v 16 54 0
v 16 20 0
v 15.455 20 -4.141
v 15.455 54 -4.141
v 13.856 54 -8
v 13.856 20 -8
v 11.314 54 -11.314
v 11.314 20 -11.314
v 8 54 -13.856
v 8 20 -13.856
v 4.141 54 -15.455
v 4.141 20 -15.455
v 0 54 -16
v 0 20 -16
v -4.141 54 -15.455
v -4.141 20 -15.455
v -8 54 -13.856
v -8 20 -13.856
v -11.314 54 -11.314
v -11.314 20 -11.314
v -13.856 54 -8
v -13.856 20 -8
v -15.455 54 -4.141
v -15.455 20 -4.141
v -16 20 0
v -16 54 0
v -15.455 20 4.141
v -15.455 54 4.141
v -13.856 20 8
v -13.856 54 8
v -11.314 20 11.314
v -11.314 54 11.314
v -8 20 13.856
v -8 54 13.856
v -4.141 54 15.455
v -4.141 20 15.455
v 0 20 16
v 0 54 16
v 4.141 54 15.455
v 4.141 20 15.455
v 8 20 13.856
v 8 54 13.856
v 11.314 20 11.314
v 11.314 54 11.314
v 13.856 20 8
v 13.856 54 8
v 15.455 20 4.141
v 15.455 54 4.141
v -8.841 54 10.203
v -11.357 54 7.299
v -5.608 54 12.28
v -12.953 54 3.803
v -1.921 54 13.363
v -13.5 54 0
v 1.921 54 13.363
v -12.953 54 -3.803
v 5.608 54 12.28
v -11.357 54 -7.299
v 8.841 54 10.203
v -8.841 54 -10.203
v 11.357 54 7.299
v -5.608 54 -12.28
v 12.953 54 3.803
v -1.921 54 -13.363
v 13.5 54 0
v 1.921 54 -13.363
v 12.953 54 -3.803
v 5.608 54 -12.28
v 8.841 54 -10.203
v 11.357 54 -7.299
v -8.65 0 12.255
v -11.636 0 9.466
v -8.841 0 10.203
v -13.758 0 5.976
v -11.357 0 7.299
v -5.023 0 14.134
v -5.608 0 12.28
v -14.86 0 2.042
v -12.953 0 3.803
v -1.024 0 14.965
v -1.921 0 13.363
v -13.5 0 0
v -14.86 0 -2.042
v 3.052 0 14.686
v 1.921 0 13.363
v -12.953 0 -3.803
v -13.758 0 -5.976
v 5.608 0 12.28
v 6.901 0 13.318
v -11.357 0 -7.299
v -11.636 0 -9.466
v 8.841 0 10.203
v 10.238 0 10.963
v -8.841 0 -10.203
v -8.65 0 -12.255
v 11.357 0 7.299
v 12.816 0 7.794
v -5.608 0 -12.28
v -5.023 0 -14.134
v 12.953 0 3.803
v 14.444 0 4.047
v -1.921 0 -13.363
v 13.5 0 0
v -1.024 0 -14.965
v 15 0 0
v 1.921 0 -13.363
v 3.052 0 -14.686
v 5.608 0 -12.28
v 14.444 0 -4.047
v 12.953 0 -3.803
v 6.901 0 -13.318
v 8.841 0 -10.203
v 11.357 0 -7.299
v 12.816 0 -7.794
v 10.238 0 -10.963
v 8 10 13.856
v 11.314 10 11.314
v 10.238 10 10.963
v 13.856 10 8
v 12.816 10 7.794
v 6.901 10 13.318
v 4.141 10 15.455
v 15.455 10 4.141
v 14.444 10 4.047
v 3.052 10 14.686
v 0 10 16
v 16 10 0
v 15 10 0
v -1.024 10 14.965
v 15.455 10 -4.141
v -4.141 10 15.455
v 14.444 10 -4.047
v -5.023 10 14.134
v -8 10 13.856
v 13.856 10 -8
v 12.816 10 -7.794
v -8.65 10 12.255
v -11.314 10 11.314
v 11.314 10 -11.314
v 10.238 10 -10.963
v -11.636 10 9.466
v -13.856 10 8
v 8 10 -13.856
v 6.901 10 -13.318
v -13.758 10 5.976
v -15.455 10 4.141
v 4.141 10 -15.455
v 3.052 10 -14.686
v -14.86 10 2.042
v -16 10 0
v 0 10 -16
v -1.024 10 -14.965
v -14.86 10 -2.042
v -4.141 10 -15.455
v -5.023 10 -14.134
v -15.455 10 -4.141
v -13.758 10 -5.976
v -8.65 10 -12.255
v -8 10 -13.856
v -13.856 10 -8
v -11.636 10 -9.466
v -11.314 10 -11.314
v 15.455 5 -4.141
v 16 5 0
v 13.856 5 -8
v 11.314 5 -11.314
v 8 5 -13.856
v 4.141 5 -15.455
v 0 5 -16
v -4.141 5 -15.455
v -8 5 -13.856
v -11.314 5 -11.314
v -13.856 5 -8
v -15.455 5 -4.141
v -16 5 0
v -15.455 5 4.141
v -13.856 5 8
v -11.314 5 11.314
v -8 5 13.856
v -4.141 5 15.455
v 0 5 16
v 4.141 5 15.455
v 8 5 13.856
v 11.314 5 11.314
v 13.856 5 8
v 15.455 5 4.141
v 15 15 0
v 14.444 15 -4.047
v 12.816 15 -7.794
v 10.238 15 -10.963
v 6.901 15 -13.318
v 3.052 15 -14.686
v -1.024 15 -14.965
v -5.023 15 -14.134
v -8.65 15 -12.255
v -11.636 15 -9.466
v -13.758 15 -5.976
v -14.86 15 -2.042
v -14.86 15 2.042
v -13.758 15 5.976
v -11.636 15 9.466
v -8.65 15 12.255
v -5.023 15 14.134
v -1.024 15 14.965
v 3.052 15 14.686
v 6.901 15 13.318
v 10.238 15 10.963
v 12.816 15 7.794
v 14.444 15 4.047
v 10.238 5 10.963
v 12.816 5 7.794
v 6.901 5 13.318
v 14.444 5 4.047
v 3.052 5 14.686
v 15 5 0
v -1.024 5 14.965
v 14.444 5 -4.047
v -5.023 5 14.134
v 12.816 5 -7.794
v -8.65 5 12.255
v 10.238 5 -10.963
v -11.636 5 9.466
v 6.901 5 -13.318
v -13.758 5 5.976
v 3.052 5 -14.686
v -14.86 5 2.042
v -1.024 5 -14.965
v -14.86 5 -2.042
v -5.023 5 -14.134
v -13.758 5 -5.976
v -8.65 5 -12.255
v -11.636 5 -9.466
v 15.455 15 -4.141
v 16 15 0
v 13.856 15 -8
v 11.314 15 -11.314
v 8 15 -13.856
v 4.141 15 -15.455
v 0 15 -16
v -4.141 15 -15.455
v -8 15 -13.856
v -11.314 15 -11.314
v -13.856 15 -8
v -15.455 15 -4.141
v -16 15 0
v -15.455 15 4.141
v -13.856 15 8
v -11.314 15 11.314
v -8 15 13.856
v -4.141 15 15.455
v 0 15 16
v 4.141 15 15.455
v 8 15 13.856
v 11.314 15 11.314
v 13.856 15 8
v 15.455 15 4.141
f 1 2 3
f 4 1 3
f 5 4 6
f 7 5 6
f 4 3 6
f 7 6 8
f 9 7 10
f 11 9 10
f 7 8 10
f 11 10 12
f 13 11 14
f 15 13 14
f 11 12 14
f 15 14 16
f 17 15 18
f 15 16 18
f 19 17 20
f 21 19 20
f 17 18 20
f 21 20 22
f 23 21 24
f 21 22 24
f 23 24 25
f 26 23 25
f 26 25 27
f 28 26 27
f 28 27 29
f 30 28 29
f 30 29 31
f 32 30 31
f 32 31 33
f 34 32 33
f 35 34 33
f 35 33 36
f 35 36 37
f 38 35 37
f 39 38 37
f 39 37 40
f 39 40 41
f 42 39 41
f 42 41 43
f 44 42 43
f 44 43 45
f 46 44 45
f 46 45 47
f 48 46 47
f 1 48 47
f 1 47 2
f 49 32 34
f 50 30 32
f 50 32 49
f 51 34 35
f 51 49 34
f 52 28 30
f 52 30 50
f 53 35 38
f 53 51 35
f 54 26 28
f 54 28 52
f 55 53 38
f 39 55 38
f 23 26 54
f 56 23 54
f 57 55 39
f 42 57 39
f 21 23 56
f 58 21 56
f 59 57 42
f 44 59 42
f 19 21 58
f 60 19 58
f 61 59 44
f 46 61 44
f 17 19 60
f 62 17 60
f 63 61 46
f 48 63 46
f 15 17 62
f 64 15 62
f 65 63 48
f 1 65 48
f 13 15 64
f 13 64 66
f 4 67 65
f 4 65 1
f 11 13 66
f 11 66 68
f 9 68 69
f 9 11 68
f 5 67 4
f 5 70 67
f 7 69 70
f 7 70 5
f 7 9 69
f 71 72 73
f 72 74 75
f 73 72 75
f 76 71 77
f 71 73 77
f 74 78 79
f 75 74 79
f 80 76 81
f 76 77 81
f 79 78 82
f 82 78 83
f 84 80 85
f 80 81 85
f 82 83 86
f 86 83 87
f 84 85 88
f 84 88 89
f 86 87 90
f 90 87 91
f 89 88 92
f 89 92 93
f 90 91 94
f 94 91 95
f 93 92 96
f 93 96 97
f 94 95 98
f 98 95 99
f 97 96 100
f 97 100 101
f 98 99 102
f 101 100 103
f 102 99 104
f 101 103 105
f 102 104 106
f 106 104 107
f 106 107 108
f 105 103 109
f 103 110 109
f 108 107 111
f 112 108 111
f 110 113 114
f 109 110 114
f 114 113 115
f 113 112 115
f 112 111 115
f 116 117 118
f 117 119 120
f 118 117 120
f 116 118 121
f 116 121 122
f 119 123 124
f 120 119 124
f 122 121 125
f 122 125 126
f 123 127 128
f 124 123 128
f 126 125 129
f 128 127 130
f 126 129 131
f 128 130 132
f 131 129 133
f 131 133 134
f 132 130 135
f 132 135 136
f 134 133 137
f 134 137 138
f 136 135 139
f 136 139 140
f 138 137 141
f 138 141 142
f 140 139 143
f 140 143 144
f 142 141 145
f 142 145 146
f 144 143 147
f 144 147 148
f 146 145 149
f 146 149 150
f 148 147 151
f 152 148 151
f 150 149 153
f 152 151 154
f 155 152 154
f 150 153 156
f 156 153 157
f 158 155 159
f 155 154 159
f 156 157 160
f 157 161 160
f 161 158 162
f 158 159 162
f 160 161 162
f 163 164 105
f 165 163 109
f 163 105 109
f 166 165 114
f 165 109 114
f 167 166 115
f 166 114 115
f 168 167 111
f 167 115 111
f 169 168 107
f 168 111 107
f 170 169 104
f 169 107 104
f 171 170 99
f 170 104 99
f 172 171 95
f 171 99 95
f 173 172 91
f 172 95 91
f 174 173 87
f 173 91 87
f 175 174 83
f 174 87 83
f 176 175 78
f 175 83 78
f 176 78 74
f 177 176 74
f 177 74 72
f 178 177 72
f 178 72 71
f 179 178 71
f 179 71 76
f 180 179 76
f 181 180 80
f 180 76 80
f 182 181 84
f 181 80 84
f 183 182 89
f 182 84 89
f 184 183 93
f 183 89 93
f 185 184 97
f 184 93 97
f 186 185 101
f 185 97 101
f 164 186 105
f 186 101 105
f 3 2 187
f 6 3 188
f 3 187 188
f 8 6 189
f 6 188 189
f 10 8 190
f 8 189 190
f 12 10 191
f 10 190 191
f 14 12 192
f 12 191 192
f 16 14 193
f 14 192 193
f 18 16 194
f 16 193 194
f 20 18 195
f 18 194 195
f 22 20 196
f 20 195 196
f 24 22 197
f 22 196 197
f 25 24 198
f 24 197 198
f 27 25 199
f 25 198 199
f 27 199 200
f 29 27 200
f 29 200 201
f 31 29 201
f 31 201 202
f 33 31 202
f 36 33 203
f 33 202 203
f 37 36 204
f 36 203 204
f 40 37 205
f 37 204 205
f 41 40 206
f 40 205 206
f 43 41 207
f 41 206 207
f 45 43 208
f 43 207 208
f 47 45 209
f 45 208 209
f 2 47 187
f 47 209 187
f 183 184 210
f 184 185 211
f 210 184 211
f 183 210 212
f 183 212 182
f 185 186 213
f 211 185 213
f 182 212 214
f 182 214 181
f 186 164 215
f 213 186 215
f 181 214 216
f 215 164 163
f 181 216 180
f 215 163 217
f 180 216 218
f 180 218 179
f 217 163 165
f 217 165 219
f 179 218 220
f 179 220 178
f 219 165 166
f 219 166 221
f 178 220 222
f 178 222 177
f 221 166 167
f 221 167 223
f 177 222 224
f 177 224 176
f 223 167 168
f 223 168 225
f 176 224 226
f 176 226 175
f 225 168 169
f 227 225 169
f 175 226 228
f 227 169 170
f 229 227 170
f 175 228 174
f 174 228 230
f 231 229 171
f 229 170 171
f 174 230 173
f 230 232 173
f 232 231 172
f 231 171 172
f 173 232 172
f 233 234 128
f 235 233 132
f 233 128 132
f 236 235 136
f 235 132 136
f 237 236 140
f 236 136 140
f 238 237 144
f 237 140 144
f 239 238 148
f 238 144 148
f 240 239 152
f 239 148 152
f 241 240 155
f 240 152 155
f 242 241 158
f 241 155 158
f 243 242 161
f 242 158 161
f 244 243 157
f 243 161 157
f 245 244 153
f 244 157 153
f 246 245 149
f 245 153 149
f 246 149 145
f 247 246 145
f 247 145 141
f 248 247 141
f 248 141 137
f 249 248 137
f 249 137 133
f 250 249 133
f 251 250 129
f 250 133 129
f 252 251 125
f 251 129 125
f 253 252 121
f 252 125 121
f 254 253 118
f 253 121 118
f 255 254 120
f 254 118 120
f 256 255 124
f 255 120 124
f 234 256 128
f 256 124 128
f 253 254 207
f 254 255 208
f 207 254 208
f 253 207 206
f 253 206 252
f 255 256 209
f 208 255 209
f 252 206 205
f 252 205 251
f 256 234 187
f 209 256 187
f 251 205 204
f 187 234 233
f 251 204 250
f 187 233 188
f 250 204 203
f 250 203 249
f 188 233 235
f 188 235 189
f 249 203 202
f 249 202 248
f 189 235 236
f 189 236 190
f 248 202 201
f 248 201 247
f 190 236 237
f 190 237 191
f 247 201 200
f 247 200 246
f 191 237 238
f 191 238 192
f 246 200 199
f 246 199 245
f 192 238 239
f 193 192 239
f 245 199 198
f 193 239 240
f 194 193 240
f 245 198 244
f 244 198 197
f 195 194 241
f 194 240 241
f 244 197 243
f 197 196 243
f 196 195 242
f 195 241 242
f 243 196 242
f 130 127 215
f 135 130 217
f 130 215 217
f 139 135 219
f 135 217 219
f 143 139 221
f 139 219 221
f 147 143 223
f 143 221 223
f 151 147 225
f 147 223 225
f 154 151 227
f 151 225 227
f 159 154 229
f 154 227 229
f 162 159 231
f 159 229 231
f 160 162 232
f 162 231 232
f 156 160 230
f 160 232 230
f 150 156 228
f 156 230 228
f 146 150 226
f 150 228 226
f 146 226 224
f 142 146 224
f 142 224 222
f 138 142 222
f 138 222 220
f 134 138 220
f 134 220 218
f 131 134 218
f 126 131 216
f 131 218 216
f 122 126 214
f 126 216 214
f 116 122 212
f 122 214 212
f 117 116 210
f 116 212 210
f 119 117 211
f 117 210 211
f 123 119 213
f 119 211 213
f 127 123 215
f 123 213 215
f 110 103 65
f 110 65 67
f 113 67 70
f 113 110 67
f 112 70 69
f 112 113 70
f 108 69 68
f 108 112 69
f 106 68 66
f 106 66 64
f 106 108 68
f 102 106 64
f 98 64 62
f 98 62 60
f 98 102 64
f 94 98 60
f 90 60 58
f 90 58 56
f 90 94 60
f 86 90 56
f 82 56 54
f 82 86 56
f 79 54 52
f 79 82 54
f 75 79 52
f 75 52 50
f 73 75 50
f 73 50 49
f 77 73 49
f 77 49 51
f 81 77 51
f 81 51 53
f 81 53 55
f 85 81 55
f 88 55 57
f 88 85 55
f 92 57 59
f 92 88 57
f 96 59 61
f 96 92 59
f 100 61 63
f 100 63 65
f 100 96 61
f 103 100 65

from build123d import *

# Parameters (mm, degrees)
SKETCH1_R           = 16
SKETCH1_R_2         = 13.5
BOSS_EXTRUDE1_DEPTH = 54


with BuildPart() as part:
    # Sketch1 → Boss-Extrude1 (new body)
    with BuildSketch(Plane(origin=(0, 0, 0), x_dir=(1, 0, 0), z_dir=(0, 1, 0))):
        Circle(SKETCH1_R)
        Circle(SKETCH1_R_2, mode=Mode.SUBTRACT)
    extrude(amount=BOSS_EXTRUDE1_DEPTH)

    # Sketch2 → Cut-Revolve2 (revolve, cut)
    with BuildSketch(Plane.XY):
        Polygon((16, 15), (16, 20), (15, 15), align=None)
        Polygon((16, 0), (16, 5), (15, 0), align=None)
        Polygon((16, 5), (16, 10), (15, 5), align=None)
        Polygon((16, 10), (16, 15), (15, 10), align=None)
    revolve(axis=Axis((0, 0, 0), (0, 1, 0)), mode=Mode.SUBTRACT)


solid = part.part
